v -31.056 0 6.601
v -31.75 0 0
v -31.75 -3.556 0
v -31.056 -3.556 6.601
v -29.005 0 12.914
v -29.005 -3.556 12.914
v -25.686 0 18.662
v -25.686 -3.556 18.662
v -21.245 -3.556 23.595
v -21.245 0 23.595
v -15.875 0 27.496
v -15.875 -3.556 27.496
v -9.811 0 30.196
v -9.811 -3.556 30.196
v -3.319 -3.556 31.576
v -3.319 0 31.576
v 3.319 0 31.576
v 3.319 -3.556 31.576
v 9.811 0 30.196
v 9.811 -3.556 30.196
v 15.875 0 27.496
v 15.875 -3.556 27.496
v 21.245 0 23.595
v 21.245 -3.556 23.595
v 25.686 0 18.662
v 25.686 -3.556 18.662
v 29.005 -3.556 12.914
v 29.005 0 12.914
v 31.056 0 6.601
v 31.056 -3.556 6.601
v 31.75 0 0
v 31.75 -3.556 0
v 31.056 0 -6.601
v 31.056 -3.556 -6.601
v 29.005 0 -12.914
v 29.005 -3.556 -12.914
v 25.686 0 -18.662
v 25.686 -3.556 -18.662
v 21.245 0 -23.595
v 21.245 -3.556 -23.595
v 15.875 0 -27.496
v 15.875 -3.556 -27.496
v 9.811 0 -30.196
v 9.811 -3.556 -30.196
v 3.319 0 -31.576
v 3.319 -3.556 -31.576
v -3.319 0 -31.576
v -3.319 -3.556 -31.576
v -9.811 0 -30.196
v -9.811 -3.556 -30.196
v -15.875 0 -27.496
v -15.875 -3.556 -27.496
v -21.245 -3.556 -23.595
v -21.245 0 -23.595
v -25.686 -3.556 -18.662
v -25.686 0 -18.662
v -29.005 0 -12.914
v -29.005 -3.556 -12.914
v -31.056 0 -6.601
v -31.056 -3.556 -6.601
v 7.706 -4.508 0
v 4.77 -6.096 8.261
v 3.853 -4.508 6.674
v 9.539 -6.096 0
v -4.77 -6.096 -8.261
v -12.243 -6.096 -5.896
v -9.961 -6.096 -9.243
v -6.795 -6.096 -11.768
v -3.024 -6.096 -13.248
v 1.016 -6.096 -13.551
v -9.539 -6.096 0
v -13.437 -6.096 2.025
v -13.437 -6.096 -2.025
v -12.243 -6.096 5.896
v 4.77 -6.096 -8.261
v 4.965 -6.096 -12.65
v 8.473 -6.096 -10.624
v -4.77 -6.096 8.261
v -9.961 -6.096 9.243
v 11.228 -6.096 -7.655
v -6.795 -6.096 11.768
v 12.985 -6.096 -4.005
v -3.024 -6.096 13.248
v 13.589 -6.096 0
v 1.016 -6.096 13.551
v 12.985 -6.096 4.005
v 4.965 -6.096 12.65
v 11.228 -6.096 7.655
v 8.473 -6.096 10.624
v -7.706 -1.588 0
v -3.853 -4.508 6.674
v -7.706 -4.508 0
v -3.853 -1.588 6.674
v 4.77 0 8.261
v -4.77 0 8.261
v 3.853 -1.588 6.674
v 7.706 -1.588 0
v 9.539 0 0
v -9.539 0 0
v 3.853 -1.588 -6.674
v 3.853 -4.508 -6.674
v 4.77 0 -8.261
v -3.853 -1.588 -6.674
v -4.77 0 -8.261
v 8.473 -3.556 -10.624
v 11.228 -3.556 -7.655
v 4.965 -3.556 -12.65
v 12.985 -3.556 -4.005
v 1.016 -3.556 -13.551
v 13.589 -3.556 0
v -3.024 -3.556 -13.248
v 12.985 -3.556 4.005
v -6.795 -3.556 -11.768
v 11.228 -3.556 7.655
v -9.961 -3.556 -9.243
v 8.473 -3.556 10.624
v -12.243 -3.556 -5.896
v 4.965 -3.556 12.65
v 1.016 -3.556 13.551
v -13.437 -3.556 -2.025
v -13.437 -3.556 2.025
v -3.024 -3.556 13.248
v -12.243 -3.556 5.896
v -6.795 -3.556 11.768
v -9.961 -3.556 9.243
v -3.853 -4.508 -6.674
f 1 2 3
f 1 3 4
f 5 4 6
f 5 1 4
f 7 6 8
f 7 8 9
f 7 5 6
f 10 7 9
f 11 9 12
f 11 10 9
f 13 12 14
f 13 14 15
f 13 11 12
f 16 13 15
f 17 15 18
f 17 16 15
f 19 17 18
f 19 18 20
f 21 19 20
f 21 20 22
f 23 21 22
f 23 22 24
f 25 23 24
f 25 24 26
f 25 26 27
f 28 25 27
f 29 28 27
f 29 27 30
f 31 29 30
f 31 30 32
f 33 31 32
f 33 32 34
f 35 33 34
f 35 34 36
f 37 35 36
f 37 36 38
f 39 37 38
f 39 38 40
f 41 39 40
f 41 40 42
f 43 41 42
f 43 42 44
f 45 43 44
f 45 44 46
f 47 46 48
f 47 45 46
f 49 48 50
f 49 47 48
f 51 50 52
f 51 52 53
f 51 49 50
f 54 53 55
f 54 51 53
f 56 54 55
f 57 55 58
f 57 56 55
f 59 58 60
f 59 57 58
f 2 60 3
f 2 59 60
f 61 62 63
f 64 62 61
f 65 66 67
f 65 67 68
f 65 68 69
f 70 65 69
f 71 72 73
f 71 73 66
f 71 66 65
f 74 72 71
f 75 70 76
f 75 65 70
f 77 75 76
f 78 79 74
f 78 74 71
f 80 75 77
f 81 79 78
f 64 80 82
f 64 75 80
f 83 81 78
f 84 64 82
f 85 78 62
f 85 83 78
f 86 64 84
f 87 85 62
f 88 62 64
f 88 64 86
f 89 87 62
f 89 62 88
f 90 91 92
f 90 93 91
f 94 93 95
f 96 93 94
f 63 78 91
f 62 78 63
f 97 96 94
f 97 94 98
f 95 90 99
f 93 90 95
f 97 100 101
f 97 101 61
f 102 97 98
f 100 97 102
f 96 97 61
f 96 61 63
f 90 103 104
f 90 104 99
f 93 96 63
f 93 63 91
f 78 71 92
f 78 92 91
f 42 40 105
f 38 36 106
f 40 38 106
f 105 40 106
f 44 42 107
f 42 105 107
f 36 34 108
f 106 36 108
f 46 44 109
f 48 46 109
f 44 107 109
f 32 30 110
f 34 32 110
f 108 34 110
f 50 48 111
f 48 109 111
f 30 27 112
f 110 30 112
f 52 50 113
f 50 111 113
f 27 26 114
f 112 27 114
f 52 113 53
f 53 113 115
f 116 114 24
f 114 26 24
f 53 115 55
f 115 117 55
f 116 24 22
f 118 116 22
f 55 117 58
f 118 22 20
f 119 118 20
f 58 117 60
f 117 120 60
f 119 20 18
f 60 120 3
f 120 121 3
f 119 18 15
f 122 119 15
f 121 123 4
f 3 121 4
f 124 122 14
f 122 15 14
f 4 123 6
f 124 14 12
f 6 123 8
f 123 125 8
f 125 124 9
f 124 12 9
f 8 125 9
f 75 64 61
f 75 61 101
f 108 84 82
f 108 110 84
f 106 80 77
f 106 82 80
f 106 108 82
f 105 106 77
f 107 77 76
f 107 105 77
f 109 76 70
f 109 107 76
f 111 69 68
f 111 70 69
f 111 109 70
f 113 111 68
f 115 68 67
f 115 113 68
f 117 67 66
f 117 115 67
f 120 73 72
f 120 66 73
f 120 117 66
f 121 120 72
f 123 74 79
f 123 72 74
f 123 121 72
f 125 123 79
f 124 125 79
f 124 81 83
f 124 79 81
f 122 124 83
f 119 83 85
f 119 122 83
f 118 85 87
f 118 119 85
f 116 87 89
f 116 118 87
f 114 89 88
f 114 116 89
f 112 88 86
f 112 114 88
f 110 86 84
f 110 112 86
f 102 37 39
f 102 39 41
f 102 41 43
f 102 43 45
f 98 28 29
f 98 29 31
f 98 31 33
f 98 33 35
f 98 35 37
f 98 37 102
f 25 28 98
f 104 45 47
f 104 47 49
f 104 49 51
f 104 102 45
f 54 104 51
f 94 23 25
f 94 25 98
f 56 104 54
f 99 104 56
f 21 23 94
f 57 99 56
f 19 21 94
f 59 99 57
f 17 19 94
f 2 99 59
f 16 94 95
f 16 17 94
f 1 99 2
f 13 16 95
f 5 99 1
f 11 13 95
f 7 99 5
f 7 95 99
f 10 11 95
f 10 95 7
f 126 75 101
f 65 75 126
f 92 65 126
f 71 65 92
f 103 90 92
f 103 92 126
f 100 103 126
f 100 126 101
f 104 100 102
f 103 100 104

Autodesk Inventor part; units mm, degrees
ref_plane "YZ Plane" through (0, 0, 0) normal (1, 0, 0) x (0, 1, 0)
ref_plane "XZ Plane" through (0, 0, 0) normal (0, 1, 0) x (-1, 0, 0)
ref_plane "XY Plane" through (0, 0, 0) normal (0, 0, 1) x (1, 0, 0)
sketch "Sketch1" plane through (0, 0, 0) normal (0, 1, 0) x (-1, 0, 0)
  circle A0 centre (0, 0) radius 31.75
  dimension "od" = 63.5
extrude "Extrusion1" add sketch "Sketch1" against normal blind 3.556
sketch "Sketch3" plane through (0, -3.556, 0) normal (0, -1, 0) x (1, 0, 0)
  circle A0 centre (0, 0) radius 13.589
  dimension "idWasher" = 27.178
extrude "Extrusion3" add sketch "Sketch3" along normal blind 2.54
sketch "Sketch2" plane through (0, 0, 0) normal (0, 1, 0) x (1, 0, 0)
  line L0 (-7.7063, 0) -> (-3.8531, 6.6738)
  line L1 (-3.8531, 6.6738) -> (3.8531, 6.6738)
  line L2 (3.8531, 6.6738) -> (7.7063, 0)
  line L3 (7.7063, 0) -> (3.8531, -6.6738)
  line L4 (3.8531, -6.6738) -> (-3.8531, -6.6738)
  line L5 (-3.8531, -6.6738) -> (-7.7063, 0)
  point P0 (0, 0)
  point P1 (0, 0)
  dimension "d3" = 13.3477
extrude "Extrusion2" cut sketch "Sketch2" against normal through all
chamfer "Chamfer1" distance 1.5875 angle 45 12 edges at (-5.7797, 0, -3.3369) (0, 0, -6.6738) (5.7797, 0, -3.3369) (5.7797, 0, 3.3369) (0, 0, 6.6738) (-5.7797, 0, 3.3369) (5.7797, -6.096, -3.3369) (5.7797, -6.096, 3.3369) (0, -6.096, 6.6738) (-5.7797, -6.096, 3.3369) (-5.7797, -6.096, -3.3369) (0, -6.096, -6.6738)
properties part number "spacerForEnd" material "PC/ABS Plastic"
